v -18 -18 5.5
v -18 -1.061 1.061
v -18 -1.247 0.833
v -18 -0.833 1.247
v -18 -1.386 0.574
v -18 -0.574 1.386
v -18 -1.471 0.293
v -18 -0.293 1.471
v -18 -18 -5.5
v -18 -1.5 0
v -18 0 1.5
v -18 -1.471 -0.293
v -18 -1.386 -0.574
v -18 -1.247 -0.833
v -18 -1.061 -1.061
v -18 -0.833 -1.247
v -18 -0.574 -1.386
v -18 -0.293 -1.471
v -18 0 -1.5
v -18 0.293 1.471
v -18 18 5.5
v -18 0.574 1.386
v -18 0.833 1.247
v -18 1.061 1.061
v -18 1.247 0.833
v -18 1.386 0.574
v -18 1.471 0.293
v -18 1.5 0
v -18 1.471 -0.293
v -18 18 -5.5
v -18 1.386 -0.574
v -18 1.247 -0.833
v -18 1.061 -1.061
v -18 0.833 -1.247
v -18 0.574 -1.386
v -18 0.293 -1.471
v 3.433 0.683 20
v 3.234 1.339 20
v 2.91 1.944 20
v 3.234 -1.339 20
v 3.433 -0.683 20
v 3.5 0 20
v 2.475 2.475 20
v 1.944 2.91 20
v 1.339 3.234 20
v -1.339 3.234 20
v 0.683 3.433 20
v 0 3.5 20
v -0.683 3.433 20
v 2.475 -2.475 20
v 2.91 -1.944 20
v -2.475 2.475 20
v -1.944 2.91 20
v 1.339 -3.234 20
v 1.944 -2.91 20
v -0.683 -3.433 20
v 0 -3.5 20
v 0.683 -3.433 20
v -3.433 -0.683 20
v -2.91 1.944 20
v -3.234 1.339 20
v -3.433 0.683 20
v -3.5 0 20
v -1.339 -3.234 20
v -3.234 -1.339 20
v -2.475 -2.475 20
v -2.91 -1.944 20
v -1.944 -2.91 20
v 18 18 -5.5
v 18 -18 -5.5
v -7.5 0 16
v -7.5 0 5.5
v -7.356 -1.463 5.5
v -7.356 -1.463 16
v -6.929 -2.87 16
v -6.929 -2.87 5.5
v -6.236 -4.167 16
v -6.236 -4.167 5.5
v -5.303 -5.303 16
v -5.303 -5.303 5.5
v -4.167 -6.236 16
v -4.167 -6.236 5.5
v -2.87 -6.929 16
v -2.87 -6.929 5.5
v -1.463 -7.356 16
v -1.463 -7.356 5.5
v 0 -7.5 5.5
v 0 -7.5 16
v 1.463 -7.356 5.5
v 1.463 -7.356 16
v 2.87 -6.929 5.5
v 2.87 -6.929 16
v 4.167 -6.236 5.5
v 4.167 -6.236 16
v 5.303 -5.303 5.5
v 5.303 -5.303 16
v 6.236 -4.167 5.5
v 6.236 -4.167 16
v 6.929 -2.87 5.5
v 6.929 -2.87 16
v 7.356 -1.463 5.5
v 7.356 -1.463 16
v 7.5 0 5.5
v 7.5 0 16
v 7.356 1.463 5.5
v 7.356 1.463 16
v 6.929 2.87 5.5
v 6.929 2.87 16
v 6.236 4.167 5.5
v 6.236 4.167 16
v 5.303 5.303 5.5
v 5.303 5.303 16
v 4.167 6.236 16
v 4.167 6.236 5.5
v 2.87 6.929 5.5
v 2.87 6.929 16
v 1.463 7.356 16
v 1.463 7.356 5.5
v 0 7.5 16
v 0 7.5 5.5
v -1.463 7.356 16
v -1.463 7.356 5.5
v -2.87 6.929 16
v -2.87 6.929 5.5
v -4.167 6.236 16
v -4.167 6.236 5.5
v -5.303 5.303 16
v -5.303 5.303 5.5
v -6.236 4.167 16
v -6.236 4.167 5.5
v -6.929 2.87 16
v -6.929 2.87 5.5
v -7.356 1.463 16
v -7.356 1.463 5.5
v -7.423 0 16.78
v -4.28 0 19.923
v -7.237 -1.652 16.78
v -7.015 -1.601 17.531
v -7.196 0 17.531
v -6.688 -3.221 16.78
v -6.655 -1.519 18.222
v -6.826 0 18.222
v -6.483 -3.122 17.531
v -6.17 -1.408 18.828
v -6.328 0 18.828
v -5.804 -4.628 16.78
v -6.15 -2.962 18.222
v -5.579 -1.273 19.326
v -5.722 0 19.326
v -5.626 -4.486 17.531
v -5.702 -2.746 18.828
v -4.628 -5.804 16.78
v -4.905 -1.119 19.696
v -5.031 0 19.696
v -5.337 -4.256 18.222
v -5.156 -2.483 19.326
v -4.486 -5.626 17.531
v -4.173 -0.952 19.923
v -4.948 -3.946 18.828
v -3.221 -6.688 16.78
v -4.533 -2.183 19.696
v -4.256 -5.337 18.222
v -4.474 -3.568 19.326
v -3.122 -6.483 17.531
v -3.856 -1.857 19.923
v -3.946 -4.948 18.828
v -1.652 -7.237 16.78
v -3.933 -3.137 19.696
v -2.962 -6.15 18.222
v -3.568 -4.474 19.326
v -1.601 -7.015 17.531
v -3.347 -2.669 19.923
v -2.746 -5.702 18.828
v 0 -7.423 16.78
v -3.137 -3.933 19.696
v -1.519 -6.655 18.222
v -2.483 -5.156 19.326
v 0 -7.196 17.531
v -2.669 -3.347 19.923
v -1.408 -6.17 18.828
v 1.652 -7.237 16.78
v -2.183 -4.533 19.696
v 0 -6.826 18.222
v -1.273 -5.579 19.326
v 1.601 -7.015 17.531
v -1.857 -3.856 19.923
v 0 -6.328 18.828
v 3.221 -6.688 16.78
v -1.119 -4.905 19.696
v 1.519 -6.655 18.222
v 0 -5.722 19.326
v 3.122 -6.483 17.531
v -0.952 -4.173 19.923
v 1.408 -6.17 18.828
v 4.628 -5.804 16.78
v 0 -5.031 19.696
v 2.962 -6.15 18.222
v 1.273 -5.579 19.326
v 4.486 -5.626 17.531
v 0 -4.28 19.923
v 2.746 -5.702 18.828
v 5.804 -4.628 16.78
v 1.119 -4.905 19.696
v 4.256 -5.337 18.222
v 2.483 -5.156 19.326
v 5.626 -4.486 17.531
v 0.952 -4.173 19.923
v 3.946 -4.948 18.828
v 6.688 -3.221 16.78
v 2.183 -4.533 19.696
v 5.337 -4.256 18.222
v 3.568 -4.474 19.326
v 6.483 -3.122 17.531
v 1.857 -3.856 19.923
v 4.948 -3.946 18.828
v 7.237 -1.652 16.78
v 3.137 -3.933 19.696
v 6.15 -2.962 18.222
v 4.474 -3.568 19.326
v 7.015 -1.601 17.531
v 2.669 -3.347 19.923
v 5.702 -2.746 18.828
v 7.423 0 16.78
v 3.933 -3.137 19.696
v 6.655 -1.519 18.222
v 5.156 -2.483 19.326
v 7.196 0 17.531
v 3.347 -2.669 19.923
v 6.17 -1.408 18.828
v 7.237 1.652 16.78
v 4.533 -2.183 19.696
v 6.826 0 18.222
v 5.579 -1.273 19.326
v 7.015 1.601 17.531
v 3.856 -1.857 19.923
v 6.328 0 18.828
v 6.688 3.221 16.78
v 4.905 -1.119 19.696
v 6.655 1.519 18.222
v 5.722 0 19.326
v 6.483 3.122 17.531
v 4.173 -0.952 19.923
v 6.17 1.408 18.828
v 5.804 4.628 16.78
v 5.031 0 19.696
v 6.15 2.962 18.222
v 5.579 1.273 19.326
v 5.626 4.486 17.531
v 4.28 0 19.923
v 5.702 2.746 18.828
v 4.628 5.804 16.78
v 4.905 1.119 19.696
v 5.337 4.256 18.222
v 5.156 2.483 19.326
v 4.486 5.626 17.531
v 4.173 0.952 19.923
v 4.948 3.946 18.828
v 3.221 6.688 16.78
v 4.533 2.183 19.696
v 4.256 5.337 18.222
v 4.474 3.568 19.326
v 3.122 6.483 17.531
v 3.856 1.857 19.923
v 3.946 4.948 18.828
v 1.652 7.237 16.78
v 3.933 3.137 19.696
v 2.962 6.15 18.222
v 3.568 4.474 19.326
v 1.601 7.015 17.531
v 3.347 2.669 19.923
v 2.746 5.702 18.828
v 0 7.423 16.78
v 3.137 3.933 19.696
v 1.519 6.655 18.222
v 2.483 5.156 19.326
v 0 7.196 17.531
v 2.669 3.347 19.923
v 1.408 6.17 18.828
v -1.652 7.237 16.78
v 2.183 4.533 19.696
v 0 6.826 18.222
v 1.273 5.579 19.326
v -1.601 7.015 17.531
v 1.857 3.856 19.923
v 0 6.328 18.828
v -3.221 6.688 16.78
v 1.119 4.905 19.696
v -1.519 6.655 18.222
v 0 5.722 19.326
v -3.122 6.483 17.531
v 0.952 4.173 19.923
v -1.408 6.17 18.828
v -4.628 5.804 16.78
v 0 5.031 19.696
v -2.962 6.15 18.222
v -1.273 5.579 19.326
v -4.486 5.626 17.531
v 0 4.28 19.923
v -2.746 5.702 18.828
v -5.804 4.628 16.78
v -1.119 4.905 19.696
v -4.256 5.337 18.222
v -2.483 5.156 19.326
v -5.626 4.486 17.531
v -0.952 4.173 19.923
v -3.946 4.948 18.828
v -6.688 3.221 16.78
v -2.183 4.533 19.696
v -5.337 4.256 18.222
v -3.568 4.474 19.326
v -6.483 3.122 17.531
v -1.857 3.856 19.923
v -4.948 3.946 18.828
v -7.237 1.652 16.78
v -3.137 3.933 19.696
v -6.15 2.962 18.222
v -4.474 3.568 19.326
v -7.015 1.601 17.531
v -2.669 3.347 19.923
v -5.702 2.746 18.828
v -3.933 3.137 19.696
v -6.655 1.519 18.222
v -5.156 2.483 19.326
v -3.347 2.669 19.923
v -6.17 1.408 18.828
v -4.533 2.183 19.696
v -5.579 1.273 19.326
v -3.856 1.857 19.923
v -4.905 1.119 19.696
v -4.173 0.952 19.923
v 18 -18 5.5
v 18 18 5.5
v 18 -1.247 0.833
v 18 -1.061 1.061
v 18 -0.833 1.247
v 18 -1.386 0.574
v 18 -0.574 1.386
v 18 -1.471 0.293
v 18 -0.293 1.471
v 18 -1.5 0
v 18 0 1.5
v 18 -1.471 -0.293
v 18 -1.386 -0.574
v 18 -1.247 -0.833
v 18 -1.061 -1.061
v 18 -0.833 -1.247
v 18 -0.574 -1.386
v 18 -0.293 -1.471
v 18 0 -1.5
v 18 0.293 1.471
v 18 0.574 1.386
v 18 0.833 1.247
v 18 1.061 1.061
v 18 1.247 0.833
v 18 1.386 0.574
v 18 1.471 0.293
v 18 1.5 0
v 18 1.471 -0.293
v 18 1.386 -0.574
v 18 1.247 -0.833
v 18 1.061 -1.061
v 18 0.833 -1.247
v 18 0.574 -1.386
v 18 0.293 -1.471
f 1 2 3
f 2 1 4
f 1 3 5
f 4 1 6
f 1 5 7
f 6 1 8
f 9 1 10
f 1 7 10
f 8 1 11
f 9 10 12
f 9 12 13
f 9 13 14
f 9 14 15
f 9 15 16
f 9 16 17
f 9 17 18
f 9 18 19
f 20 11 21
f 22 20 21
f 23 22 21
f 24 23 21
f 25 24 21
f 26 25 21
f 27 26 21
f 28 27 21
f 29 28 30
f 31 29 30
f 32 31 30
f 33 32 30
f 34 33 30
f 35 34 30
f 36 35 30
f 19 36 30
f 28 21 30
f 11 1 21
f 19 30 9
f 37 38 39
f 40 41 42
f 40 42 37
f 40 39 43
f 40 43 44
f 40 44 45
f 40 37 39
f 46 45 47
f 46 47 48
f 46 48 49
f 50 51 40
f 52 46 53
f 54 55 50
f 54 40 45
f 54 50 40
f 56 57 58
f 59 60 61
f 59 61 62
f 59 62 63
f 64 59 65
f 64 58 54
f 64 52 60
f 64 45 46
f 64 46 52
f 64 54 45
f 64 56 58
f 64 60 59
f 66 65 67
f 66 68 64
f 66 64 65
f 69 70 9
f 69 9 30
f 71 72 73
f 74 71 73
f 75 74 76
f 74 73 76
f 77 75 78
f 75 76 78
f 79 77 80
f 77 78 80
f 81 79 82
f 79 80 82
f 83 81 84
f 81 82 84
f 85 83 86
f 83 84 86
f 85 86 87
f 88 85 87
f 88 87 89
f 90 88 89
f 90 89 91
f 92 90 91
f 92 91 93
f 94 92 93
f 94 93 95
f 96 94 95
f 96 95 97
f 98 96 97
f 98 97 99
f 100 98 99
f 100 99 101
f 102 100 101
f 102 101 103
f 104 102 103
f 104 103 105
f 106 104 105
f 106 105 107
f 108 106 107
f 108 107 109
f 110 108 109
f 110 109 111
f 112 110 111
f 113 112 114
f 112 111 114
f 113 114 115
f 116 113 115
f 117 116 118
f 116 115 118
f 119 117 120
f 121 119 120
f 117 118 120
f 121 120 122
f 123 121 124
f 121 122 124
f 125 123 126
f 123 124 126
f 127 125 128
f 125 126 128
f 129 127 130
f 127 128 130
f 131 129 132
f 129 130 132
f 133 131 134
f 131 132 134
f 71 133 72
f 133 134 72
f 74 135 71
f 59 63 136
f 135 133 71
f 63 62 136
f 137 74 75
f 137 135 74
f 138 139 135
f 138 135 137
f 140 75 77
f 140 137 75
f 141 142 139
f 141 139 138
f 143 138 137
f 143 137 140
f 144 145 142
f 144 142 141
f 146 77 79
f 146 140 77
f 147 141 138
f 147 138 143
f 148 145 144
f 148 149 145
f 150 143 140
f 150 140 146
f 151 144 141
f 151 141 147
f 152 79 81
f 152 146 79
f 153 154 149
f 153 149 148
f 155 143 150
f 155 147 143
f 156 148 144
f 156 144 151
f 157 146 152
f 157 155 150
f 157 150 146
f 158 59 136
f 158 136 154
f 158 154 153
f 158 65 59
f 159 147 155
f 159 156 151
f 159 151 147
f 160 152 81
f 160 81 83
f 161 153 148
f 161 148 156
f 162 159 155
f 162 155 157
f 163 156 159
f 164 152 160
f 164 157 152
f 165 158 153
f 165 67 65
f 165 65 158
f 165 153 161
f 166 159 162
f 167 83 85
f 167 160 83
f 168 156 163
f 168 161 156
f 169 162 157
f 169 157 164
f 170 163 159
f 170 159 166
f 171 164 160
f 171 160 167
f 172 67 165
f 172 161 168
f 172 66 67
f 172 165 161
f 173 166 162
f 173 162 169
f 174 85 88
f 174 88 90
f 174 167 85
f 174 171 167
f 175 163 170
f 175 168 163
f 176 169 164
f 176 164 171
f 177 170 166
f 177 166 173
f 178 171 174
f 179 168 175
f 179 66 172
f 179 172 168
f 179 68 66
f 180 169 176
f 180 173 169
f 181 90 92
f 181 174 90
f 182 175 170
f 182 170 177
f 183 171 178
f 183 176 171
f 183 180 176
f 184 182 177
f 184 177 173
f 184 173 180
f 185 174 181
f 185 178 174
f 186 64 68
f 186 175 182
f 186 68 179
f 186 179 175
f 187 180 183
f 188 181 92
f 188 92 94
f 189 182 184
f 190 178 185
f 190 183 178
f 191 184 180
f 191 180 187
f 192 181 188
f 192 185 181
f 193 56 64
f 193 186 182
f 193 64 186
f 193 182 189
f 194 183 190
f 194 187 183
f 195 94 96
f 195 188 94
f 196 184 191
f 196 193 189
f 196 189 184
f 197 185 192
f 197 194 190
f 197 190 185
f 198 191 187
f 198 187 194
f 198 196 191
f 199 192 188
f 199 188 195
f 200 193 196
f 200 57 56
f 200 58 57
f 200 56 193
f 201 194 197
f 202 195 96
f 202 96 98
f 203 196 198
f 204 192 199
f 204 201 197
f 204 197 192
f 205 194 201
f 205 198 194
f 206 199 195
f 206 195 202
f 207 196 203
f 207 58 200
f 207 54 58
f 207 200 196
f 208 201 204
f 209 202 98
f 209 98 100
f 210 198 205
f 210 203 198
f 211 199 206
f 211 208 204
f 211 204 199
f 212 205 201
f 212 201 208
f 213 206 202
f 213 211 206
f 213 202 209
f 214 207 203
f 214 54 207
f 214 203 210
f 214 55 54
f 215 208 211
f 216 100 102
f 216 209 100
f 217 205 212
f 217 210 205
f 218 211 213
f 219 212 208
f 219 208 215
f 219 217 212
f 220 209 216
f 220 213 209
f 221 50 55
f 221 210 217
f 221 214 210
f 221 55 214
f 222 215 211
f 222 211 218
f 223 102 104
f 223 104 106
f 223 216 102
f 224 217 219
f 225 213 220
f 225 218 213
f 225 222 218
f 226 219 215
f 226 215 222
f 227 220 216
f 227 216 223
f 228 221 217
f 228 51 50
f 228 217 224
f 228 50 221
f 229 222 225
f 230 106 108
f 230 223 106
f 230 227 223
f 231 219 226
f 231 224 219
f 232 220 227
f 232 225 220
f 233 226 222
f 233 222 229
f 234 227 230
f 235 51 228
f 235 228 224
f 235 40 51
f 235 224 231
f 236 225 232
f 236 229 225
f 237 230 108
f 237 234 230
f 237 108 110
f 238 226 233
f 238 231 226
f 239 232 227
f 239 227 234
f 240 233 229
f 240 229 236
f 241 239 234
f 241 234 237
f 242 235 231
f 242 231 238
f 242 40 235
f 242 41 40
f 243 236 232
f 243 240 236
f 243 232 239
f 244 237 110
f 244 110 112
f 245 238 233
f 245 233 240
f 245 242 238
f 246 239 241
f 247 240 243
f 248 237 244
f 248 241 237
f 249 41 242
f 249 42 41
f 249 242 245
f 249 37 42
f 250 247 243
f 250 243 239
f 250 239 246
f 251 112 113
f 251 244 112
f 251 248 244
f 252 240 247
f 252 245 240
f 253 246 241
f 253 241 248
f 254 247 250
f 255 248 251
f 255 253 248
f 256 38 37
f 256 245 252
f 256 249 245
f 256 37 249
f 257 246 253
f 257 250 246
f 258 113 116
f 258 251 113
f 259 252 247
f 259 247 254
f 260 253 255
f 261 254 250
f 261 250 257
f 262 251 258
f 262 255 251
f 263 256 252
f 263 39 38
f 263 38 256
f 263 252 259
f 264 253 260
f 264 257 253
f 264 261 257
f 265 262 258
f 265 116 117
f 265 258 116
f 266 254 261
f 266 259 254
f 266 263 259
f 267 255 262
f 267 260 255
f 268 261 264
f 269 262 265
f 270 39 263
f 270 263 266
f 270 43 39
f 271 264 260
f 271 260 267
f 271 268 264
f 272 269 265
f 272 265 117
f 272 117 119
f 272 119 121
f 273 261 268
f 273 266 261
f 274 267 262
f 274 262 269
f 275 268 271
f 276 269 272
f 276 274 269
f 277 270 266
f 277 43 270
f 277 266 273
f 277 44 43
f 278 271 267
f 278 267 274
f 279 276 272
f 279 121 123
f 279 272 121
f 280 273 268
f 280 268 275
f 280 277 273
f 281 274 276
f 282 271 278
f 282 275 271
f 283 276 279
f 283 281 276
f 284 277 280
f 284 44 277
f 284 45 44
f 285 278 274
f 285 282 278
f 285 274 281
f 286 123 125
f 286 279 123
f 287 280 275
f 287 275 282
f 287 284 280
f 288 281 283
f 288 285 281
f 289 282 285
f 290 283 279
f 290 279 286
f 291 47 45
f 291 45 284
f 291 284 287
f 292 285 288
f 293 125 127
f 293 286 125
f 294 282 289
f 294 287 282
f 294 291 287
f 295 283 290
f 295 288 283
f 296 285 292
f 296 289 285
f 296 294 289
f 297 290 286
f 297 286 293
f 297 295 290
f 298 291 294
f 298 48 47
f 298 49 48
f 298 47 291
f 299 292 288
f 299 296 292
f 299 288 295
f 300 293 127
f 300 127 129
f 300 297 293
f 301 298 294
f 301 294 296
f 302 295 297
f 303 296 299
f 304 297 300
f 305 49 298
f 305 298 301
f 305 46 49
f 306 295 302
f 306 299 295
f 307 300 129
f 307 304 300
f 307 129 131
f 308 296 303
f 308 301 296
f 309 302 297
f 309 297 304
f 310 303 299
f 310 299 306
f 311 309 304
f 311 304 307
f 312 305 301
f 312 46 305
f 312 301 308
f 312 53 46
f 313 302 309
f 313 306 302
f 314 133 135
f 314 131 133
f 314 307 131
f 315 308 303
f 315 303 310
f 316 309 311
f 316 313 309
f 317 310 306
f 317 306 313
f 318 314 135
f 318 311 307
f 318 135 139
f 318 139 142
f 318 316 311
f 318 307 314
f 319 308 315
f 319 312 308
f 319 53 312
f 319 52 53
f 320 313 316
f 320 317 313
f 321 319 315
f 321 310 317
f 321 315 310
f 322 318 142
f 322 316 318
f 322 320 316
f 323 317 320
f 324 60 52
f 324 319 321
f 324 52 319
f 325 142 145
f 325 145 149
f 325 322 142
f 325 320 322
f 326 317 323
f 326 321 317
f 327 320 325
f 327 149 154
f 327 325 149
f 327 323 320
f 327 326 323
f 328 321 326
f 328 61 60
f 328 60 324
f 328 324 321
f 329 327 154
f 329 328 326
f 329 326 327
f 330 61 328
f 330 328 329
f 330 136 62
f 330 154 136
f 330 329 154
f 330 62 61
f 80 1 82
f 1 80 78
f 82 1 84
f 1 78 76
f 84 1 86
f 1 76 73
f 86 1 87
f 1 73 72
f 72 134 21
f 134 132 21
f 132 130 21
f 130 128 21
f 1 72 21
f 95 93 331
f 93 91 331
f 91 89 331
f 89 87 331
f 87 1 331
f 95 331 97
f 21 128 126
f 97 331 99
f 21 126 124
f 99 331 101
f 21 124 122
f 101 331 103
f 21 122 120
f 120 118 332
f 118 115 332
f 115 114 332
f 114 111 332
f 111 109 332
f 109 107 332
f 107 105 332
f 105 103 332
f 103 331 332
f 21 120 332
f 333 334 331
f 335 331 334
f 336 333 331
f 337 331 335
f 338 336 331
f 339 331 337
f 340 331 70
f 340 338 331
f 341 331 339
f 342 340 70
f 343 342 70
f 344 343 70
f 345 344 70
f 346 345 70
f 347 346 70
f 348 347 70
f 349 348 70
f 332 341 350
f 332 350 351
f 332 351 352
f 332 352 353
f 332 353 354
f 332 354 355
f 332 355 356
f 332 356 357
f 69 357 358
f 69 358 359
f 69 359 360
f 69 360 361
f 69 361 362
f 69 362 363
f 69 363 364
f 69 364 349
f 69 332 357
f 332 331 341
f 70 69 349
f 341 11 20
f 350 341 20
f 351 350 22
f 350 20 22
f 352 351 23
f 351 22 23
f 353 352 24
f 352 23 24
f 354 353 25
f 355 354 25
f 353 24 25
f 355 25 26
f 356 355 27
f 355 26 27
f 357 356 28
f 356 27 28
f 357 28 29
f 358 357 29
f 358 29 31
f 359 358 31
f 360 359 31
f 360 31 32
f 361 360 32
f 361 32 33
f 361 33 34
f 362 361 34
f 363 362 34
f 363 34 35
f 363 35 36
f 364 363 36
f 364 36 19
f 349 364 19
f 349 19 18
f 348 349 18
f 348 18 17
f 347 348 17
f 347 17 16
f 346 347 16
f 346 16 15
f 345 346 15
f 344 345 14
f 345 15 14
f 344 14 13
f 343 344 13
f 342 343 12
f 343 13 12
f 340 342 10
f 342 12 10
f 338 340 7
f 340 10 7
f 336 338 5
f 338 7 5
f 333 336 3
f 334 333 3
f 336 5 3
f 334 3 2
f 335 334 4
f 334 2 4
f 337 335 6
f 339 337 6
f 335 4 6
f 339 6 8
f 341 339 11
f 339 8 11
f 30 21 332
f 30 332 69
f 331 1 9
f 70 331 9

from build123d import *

# Parameters (mm, degrees)
SKETCH_1_W          = 11
SKETCH_1_H          = 36
EXTRUDE_1_DEPTH     = 18
SKETCH_2_R          = 7.5
EXTRUDE_2_DEPTH     = 20
FILLET_3_R          = 4
SKETCH_3_R          = 1.5
CUT_EXTRUDE_1_DEPTH = 45.944410108


with BuildPart() as part:
    # 草图1 → 凸台-拉伸1 (new, symmetric)
    with BuildSketch(Plane(origin=(0, 0, 0), x_dir=(0, 0, -1), z_dir=(1, 0, 0))):
        Rectangle(SKETCH_1_W, SKETCH_1_H)
    extrude(amount=EXTRUDE_1_DEPTH, both=True)

    # 草图2 → 凸台-拉伸2 (add)
    with BuildSketch(Plane.XY):
        with Locations(Location((0, 0, 0), (0, 0, 180))):
            Circle(SKETCH_2_R)
    extrude(amount=EXTRUDE_2_DEPTH)

    # 圆角3
    fillet_3_edges = [part.edges().sort_by_distance(p)[0] for p in [
        (7.5, 0, 20),
    ]]
    fillet(fillet_3_edges, radius=FILLET_3_R)

    # 草图3 → 切除-拉伸1 (cut, through all)
    with BuildSketch(Plane.ZY.offset(18)):
        Circle(SKETCH_3_R)
    extrude(amount=-CUT_EXTRUDE_1_DEPTH, mode=Mode.SUBTRACT)


solid = part.part
